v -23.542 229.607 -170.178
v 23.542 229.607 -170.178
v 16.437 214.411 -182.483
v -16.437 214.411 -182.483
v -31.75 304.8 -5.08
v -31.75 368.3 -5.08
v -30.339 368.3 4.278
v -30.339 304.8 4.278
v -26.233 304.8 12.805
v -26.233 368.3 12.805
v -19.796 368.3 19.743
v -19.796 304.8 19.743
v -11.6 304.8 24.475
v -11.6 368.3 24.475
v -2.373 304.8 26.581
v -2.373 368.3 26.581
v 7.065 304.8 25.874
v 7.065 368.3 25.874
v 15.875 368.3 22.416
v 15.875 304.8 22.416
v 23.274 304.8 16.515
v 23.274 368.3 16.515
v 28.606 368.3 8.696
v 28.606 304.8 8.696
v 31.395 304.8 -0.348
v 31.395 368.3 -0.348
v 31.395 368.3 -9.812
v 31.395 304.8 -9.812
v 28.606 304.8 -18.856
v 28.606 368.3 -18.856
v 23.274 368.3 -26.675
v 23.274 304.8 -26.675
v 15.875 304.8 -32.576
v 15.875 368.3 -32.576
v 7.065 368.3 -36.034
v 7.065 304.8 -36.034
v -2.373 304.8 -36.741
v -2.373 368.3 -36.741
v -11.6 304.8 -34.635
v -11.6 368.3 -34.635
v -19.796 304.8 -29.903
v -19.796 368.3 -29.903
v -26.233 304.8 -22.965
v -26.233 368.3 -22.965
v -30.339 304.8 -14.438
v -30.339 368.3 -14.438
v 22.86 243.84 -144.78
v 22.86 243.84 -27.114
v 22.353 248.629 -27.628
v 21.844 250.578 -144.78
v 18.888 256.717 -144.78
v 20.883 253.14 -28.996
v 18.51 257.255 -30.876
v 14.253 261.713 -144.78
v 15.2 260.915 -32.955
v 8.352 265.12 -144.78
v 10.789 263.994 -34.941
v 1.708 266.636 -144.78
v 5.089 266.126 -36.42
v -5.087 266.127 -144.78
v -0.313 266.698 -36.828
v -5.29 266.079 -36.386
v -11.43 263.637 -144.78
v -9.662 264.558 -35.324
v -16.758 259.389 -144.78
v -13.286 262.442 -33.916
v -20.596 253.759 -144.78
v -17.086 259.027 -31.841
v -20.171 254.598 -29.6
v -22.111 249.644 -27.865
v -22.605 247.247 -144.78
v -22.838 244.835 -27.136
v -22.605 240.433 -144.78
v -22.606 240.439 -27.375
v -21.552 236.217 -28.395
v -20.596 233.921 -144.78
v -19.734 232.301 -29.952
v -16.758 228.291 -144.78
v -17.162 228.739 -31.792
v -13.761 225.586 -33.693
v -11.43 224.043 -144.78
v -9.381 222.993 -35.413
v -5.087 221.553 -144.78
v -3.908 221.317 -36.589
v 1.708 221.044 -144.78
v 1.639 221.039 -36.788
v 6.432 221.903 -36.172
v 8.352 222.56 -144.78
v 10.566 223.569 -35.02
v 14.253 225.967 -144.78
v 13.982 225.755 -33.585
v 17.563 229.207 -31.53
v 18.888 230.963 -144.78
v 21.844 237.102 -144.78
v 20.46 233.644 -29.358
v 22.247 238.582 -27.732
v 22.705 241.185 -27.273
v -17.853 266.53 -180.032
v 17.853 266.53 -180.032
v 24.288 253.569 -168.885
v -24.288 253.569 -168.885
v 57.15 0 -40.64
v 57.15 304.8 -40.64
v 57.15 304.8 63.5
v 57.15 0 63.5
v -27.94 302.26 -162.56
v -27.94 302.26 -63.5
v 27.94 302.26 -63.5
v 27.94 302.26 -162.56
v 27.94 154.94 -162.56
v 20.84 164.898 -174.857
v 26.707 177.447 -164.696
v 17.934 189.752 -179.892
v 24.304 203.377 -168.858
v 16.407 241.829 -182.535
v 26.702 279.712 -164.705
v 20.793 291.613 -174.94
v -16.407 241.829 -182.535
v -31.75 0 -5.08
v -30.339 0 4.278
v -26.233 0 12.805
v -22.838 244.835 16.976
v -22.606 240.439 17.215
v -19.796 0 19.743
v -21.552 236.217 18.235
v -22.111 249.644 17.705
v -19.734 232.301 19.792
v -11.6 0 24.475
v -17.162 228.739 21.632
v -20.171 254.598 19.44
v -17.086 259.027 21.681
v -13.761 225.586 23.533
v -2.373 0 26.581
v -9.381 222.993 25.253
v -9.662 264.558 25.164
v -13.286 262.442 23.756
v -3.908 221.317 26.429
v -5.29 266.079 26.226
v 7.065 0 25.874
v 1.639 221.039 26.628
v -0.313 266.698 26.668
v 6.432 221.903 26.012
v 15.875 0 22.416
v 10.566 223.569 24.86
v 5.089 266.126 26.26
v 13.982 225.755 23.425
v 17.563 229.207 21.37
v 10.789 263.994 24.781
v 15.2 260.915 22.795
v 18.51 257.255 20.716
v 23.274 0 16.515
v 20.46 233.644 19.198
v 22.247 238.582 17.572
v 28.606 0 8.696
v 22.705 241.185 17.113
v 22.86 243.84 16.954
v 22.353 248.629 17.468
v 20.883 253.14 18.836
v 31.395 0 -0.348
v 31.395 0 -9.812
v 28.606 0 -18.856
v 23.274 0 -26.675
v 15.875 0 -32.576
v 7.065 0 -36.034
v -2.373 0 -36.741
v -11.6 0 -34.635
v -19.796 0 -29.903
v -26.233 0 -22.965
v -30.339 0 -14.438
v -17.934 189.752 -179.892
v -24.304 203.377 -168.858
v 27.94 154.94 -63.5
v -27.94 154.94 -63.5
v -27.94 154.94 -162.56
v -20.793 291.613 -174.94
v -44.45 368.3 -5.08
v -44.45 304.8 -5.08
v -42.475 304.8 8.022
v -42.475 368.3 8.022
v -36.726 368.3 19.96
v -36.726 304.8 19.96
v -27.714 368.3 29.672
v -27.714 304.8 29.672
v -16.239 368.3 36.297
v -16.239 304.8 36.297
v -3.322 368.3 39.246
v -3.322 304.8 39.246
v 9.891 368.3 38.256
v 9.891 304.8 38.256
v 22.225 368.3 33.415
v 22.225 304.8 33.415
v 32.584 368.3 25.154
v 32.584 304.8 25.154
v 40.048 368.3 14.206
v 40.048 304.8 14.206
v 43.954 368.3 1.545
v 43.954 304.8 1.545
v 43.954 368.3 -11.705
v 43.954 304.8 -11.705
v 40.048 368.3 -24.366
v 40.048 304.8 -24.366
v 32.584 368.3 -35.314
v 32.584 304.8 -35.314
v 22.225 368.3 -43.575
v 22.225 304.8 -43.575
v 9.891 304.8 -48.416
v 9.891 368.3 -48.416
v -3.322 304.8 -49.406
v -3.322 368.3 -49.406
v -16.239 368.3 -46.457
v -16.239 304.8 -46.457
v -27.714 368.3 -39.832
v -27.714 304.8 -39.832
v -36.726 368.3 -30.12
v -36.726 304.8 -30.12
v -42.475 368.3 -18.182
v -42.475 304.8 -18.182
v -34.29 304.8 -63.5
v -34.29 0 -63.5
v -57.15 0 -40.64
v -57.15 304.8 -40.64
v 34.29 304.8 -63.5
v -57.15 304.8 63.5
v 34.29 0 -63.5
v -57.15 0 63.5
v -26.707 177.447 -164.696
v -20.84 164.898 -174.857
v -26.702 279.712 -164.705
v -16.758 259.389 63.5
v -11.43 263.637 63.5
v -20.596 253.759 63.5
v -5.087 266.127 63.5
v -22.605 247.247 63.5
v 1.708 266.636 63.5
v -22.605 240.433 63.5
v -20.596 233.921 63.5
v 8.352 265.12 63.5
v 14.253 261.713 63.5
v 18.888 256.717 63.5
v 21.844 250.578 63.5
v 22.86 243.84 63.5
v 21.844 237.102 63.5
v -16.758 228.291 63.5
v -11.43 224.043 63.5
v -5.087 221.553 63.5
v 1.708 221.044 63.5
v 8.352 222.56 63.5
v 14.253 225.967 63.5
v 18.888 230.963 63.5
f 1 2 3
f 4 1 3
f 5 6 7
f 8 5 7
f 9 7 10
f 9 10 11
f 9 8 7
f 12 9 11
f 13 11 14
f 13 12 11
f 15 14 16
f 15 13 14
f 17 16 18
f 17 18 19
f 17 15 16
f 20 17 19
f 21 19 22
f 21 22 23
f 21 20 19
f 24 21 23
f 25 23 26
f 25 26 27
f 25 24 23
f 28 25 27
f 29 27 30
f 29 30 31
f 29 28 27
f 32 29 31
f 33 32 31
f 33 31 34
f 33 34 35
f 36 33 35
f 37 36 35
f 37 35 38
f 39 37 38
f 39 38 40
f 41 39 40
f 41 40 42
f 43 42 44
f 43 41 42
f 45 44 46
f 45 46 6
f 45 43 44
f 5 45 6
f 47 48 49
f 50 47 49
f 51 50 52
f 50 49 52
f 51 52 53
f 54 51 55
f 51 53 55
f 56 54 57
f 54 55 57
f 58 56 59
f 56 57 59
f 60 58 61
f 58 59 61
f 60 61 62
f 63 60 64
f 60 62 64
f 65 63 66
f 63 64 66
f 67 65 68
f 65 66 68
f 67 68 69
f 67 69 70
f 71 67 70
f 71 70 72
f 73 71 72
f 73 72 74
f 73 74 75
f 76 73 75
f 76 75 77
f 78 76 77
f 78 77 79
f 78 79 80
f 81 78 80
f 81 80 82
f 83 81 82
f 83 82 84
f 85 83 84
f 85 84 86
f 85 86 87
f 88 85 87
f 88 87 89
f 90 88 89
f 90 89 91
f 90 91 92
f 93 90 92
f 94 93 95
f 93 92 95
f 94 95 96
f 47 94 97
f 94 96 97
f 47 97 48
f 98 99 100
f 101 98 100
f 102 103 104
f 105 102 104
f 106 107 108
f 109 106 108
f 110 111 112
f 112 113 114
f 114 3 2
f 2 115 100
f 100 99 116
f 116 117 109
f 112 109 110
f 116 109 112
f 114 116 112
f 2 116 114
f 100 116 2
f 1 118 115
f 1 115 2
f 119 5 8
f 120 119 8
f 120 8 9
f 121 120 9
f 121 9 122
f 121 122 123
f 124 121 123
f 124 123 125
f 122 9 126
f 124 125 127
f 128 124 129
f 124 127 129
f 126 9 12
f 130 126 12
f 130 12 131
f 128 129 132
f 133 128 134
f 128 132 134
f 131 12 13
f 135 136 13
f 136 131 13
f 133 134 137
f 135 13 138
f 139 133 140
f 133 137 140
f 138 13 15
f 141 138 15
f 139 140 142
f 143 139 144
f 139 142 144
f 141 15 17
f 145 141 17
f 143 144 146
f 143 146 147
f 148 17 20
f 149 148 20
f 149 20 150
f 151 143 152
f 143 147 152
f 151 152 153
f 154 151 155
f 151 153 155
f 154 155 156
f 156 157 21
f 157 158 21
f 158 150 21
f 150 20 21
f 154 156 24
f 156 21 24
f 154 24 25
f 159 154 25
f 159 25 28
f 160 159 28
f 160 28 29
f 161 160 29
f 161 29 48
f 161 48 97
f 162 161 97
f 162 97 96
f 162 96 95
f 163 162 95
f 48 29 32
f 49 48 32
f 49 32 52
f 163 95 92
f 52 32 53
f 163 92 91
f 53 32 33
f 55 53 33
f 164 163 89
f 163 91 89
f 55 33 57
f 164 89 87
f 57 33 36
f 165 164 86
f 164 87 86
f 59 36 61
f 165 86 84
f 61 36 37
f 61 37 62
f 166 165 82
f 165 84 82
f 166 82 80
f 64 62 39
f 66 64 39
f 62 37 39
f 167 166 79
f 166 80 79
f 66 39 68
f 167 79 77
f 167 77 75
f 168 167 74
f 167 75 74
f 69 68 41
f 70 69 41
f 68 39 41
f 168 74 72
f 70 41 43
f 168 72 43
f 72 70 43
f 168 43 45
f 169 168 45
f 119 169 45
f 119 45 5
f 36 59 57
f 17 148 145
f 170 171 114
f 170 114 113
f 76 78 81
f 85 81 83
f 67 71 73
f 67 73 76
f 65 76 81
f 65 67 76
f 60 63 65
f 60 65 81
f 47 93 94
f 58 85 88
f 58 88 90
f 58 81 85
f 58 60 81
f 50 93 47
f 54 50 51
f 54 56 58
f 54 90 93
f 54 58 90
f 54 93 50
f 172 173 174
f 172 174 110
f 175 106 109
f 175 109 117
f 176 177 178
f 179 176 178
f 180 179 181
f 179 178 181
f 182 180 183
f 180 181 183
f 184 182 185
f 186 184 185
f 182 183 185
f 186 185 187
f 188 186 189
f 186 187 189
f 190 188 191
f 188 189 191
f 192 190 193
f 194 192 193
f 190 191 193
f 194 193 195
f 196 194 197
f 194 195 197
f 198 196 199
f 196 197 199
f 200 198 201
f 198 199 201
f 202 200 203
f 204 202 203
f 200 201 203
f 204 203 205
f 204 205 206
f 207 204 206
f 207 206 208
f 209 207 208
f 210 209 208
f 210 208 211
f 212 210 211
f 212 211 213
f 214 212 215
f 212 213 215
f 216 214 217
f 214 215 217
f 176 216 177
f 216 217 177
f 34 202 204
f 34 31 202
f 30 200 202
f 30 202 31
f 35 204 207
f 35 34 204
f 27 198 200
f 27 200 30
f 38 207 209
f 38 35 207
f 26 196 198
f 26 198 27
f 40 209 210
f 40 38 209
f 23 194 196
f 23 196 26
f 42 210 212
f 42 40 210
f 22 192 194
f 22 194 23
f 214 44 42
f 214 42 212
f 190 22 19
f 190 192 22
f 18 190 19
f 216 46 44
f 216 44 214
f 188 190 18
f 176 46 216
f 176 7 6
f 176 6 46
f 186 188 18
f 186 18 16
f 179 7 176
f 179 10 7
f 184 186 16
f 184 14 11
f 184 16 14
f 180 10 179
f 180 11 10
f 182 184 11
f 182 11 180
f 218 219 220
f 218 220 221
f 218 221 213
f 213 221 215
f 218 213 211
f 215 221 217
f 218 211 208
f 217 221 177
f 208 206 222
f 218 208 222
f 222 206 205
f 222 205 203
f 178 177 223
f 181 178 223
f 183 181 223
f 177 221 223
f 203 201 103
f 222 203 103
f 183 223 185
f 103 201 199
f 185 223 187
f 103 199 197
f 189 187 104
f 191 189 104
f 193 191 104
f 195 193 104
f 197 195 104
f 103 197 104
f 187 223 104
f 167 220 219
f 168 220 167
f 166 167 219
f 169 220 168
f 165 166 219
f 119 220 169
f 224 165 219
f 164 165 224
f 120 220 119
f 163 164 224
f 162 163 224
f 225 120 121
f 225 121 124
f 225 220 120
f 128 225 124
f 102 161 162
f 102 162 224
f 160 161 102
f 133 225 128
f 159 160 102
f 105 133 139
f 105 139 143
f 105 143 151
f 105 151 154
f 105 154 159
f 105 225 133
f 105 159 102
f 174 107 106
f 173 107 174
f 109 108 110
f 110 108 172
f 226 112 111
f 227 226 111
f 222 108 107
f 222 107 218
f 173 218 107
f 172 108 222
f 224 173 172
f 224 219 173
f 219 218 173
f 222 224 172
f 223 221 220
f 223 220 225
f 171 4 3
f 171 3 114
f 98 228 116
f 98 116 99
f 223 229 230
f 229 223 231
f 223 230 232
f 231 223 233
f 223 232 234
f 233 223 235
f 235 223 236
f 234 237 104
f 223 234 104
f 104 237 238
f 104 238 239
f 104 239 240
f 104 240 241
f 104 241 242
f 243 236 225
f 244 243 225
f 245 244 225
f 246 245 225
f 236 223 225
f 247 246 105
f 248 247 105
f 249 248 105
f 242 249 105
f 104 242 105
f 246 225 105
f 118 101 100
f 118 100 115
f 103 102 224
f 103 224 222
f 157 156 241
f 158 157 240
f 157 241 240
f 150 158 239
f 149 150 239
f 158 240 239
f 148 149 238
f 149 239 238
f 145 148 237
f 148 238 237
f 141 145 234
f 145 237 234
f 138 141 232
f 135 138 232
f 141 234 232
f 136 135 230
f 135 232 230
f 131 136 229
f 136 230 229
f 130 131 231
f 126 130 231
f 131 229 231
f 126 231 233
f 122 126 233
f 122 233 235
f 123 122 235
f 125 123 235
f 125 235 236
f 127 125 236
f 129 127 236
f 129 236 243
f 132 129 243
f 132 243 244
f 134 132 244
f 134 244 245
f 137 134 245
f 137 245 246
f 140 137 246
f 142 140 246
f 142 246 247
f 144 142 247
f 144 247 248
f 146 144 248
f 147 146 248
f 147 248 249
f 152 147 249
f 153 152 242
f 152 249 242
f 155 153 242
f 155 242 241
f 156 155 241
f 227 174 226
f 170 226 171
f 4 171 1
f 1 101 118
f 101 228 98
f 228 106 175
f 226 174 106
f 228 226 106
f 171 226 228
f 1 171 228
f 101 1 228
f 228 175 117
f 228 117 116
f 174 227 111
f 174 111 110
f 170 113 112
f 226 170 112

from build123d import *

# Parameters (mm, degrees)
F0_W      = 114.3
F0_H      = 127
F1_DEPTH  = 304.8
F2_SIZE2  = 22.86
F2_SIZE   = 22.86
F4_D      = 63.5
F5_R      = 44.45
F5_R_2    = 31.75
F6_DEPTH  = 63.5
F8_W      = 55.88
F8_H      = 99.06
F9_DEPTH  = 147.32
F11_DEPTH = 55.88
F13_DEPTH = 302.261
F14_R     = 22.86
F15_DEPTH = 208.28


with BuildPart() as f1:
    # F0 (on Front) → F1 (new body)
    with BuildSketch(Plane.XZ):
        Rectangle(F0_W, F0_H)
    extrude(amount=-F1_DEPTH)

    # F2
    f2_edges = [f1.edges().sort_by_distance(p)[0] for p in [
        (57.15, 152.4, -63.5),
        (-57.15, 152.4, -63.5),
    ]]
    chamfer(f2_edges, length=F2_SIZE, length2=F2_SIZE2)

    # F4 (through all)
    with Locations(Plane.XZ):
        with Locations((0, -5.08)):
            Hole(F4_D / 2)

    # F5 (on face) → F6 (join)
    with BuildSketch(Plane(origin=(0, 304.8, 0), x_dir=(-1, 0, 0), z_dir=(0, 1, 0))):
        with Locations((0, -5.08)):
            Circle(F5_R)
        with Locations((0, -5.08)):
            Circle(F5_R_2, mode=Mode.SUBTRACT)
    extrude(amount=F6_DEPTH)

    # F8 (on offset) → F9 (join)
    with BuildSketch(Plane.XZ.offset(-154.94)):
        with Locations((0, -113.03)):
            Rectangle(F8_W, F8_H)
    extrude(amount=-F9_DEPTH)

    # F10 (on face) → F11 (join)
    with BuildSketch(Plane(origin=(-27.94, 0, 0), x_dir=(0, -1, 0), z_dir=(-1, 0, 0))):
        Polygon((-214.4107755243, -182.4833633625), (-203.3772818135, -168.8581333524), (-189.7520518034, -179.8916270632), (-177.4465882231, -164.6956450781), (-164.8980907601, -174.8572179642), (-154.94, -162.56), (-302.26, -162.56), (-291.6130993959, -174.939645827), (-279.7122911913, -164.7045612509), (-266.5302445016, -180.0319391764), (-253.5688132322, -168.8846840497), (-241.828860398, -182.5352724715), (-229.6067575095, -170.1778997822), align=None)
    extrude(amount=-F11_DEPTH)

    # F12 (on face) → F13 (cut, through all)
    with BuildSketch(Plane(origin=(0, 302.26, 0), x_dir=(-1, 0, 0), z_dir=(0, 1, 0))):
        Polygon((-13.8513900767, -186.9621881951), (-27.94, -162.56), (-27.94, -186.9621881951), align=None)
        Polygon((27.94, -186.9621881951), (27.94, -162.56), (13.8513900767, -186.9621881951), align=None)
    extrude(amount=-F13_DEPTH, mode=Mode.SUBTRACT)

    # F14 (on face) → F15 (cut)
    with BuildSketch(Plane.XY.offset(63.5)):
        with Locations((0, 243.84)):
            Circle(F14_R)
    extrude(amount=-F15_DEPTH, mode=Mode.SUBTRACT)


solid = f1.part
